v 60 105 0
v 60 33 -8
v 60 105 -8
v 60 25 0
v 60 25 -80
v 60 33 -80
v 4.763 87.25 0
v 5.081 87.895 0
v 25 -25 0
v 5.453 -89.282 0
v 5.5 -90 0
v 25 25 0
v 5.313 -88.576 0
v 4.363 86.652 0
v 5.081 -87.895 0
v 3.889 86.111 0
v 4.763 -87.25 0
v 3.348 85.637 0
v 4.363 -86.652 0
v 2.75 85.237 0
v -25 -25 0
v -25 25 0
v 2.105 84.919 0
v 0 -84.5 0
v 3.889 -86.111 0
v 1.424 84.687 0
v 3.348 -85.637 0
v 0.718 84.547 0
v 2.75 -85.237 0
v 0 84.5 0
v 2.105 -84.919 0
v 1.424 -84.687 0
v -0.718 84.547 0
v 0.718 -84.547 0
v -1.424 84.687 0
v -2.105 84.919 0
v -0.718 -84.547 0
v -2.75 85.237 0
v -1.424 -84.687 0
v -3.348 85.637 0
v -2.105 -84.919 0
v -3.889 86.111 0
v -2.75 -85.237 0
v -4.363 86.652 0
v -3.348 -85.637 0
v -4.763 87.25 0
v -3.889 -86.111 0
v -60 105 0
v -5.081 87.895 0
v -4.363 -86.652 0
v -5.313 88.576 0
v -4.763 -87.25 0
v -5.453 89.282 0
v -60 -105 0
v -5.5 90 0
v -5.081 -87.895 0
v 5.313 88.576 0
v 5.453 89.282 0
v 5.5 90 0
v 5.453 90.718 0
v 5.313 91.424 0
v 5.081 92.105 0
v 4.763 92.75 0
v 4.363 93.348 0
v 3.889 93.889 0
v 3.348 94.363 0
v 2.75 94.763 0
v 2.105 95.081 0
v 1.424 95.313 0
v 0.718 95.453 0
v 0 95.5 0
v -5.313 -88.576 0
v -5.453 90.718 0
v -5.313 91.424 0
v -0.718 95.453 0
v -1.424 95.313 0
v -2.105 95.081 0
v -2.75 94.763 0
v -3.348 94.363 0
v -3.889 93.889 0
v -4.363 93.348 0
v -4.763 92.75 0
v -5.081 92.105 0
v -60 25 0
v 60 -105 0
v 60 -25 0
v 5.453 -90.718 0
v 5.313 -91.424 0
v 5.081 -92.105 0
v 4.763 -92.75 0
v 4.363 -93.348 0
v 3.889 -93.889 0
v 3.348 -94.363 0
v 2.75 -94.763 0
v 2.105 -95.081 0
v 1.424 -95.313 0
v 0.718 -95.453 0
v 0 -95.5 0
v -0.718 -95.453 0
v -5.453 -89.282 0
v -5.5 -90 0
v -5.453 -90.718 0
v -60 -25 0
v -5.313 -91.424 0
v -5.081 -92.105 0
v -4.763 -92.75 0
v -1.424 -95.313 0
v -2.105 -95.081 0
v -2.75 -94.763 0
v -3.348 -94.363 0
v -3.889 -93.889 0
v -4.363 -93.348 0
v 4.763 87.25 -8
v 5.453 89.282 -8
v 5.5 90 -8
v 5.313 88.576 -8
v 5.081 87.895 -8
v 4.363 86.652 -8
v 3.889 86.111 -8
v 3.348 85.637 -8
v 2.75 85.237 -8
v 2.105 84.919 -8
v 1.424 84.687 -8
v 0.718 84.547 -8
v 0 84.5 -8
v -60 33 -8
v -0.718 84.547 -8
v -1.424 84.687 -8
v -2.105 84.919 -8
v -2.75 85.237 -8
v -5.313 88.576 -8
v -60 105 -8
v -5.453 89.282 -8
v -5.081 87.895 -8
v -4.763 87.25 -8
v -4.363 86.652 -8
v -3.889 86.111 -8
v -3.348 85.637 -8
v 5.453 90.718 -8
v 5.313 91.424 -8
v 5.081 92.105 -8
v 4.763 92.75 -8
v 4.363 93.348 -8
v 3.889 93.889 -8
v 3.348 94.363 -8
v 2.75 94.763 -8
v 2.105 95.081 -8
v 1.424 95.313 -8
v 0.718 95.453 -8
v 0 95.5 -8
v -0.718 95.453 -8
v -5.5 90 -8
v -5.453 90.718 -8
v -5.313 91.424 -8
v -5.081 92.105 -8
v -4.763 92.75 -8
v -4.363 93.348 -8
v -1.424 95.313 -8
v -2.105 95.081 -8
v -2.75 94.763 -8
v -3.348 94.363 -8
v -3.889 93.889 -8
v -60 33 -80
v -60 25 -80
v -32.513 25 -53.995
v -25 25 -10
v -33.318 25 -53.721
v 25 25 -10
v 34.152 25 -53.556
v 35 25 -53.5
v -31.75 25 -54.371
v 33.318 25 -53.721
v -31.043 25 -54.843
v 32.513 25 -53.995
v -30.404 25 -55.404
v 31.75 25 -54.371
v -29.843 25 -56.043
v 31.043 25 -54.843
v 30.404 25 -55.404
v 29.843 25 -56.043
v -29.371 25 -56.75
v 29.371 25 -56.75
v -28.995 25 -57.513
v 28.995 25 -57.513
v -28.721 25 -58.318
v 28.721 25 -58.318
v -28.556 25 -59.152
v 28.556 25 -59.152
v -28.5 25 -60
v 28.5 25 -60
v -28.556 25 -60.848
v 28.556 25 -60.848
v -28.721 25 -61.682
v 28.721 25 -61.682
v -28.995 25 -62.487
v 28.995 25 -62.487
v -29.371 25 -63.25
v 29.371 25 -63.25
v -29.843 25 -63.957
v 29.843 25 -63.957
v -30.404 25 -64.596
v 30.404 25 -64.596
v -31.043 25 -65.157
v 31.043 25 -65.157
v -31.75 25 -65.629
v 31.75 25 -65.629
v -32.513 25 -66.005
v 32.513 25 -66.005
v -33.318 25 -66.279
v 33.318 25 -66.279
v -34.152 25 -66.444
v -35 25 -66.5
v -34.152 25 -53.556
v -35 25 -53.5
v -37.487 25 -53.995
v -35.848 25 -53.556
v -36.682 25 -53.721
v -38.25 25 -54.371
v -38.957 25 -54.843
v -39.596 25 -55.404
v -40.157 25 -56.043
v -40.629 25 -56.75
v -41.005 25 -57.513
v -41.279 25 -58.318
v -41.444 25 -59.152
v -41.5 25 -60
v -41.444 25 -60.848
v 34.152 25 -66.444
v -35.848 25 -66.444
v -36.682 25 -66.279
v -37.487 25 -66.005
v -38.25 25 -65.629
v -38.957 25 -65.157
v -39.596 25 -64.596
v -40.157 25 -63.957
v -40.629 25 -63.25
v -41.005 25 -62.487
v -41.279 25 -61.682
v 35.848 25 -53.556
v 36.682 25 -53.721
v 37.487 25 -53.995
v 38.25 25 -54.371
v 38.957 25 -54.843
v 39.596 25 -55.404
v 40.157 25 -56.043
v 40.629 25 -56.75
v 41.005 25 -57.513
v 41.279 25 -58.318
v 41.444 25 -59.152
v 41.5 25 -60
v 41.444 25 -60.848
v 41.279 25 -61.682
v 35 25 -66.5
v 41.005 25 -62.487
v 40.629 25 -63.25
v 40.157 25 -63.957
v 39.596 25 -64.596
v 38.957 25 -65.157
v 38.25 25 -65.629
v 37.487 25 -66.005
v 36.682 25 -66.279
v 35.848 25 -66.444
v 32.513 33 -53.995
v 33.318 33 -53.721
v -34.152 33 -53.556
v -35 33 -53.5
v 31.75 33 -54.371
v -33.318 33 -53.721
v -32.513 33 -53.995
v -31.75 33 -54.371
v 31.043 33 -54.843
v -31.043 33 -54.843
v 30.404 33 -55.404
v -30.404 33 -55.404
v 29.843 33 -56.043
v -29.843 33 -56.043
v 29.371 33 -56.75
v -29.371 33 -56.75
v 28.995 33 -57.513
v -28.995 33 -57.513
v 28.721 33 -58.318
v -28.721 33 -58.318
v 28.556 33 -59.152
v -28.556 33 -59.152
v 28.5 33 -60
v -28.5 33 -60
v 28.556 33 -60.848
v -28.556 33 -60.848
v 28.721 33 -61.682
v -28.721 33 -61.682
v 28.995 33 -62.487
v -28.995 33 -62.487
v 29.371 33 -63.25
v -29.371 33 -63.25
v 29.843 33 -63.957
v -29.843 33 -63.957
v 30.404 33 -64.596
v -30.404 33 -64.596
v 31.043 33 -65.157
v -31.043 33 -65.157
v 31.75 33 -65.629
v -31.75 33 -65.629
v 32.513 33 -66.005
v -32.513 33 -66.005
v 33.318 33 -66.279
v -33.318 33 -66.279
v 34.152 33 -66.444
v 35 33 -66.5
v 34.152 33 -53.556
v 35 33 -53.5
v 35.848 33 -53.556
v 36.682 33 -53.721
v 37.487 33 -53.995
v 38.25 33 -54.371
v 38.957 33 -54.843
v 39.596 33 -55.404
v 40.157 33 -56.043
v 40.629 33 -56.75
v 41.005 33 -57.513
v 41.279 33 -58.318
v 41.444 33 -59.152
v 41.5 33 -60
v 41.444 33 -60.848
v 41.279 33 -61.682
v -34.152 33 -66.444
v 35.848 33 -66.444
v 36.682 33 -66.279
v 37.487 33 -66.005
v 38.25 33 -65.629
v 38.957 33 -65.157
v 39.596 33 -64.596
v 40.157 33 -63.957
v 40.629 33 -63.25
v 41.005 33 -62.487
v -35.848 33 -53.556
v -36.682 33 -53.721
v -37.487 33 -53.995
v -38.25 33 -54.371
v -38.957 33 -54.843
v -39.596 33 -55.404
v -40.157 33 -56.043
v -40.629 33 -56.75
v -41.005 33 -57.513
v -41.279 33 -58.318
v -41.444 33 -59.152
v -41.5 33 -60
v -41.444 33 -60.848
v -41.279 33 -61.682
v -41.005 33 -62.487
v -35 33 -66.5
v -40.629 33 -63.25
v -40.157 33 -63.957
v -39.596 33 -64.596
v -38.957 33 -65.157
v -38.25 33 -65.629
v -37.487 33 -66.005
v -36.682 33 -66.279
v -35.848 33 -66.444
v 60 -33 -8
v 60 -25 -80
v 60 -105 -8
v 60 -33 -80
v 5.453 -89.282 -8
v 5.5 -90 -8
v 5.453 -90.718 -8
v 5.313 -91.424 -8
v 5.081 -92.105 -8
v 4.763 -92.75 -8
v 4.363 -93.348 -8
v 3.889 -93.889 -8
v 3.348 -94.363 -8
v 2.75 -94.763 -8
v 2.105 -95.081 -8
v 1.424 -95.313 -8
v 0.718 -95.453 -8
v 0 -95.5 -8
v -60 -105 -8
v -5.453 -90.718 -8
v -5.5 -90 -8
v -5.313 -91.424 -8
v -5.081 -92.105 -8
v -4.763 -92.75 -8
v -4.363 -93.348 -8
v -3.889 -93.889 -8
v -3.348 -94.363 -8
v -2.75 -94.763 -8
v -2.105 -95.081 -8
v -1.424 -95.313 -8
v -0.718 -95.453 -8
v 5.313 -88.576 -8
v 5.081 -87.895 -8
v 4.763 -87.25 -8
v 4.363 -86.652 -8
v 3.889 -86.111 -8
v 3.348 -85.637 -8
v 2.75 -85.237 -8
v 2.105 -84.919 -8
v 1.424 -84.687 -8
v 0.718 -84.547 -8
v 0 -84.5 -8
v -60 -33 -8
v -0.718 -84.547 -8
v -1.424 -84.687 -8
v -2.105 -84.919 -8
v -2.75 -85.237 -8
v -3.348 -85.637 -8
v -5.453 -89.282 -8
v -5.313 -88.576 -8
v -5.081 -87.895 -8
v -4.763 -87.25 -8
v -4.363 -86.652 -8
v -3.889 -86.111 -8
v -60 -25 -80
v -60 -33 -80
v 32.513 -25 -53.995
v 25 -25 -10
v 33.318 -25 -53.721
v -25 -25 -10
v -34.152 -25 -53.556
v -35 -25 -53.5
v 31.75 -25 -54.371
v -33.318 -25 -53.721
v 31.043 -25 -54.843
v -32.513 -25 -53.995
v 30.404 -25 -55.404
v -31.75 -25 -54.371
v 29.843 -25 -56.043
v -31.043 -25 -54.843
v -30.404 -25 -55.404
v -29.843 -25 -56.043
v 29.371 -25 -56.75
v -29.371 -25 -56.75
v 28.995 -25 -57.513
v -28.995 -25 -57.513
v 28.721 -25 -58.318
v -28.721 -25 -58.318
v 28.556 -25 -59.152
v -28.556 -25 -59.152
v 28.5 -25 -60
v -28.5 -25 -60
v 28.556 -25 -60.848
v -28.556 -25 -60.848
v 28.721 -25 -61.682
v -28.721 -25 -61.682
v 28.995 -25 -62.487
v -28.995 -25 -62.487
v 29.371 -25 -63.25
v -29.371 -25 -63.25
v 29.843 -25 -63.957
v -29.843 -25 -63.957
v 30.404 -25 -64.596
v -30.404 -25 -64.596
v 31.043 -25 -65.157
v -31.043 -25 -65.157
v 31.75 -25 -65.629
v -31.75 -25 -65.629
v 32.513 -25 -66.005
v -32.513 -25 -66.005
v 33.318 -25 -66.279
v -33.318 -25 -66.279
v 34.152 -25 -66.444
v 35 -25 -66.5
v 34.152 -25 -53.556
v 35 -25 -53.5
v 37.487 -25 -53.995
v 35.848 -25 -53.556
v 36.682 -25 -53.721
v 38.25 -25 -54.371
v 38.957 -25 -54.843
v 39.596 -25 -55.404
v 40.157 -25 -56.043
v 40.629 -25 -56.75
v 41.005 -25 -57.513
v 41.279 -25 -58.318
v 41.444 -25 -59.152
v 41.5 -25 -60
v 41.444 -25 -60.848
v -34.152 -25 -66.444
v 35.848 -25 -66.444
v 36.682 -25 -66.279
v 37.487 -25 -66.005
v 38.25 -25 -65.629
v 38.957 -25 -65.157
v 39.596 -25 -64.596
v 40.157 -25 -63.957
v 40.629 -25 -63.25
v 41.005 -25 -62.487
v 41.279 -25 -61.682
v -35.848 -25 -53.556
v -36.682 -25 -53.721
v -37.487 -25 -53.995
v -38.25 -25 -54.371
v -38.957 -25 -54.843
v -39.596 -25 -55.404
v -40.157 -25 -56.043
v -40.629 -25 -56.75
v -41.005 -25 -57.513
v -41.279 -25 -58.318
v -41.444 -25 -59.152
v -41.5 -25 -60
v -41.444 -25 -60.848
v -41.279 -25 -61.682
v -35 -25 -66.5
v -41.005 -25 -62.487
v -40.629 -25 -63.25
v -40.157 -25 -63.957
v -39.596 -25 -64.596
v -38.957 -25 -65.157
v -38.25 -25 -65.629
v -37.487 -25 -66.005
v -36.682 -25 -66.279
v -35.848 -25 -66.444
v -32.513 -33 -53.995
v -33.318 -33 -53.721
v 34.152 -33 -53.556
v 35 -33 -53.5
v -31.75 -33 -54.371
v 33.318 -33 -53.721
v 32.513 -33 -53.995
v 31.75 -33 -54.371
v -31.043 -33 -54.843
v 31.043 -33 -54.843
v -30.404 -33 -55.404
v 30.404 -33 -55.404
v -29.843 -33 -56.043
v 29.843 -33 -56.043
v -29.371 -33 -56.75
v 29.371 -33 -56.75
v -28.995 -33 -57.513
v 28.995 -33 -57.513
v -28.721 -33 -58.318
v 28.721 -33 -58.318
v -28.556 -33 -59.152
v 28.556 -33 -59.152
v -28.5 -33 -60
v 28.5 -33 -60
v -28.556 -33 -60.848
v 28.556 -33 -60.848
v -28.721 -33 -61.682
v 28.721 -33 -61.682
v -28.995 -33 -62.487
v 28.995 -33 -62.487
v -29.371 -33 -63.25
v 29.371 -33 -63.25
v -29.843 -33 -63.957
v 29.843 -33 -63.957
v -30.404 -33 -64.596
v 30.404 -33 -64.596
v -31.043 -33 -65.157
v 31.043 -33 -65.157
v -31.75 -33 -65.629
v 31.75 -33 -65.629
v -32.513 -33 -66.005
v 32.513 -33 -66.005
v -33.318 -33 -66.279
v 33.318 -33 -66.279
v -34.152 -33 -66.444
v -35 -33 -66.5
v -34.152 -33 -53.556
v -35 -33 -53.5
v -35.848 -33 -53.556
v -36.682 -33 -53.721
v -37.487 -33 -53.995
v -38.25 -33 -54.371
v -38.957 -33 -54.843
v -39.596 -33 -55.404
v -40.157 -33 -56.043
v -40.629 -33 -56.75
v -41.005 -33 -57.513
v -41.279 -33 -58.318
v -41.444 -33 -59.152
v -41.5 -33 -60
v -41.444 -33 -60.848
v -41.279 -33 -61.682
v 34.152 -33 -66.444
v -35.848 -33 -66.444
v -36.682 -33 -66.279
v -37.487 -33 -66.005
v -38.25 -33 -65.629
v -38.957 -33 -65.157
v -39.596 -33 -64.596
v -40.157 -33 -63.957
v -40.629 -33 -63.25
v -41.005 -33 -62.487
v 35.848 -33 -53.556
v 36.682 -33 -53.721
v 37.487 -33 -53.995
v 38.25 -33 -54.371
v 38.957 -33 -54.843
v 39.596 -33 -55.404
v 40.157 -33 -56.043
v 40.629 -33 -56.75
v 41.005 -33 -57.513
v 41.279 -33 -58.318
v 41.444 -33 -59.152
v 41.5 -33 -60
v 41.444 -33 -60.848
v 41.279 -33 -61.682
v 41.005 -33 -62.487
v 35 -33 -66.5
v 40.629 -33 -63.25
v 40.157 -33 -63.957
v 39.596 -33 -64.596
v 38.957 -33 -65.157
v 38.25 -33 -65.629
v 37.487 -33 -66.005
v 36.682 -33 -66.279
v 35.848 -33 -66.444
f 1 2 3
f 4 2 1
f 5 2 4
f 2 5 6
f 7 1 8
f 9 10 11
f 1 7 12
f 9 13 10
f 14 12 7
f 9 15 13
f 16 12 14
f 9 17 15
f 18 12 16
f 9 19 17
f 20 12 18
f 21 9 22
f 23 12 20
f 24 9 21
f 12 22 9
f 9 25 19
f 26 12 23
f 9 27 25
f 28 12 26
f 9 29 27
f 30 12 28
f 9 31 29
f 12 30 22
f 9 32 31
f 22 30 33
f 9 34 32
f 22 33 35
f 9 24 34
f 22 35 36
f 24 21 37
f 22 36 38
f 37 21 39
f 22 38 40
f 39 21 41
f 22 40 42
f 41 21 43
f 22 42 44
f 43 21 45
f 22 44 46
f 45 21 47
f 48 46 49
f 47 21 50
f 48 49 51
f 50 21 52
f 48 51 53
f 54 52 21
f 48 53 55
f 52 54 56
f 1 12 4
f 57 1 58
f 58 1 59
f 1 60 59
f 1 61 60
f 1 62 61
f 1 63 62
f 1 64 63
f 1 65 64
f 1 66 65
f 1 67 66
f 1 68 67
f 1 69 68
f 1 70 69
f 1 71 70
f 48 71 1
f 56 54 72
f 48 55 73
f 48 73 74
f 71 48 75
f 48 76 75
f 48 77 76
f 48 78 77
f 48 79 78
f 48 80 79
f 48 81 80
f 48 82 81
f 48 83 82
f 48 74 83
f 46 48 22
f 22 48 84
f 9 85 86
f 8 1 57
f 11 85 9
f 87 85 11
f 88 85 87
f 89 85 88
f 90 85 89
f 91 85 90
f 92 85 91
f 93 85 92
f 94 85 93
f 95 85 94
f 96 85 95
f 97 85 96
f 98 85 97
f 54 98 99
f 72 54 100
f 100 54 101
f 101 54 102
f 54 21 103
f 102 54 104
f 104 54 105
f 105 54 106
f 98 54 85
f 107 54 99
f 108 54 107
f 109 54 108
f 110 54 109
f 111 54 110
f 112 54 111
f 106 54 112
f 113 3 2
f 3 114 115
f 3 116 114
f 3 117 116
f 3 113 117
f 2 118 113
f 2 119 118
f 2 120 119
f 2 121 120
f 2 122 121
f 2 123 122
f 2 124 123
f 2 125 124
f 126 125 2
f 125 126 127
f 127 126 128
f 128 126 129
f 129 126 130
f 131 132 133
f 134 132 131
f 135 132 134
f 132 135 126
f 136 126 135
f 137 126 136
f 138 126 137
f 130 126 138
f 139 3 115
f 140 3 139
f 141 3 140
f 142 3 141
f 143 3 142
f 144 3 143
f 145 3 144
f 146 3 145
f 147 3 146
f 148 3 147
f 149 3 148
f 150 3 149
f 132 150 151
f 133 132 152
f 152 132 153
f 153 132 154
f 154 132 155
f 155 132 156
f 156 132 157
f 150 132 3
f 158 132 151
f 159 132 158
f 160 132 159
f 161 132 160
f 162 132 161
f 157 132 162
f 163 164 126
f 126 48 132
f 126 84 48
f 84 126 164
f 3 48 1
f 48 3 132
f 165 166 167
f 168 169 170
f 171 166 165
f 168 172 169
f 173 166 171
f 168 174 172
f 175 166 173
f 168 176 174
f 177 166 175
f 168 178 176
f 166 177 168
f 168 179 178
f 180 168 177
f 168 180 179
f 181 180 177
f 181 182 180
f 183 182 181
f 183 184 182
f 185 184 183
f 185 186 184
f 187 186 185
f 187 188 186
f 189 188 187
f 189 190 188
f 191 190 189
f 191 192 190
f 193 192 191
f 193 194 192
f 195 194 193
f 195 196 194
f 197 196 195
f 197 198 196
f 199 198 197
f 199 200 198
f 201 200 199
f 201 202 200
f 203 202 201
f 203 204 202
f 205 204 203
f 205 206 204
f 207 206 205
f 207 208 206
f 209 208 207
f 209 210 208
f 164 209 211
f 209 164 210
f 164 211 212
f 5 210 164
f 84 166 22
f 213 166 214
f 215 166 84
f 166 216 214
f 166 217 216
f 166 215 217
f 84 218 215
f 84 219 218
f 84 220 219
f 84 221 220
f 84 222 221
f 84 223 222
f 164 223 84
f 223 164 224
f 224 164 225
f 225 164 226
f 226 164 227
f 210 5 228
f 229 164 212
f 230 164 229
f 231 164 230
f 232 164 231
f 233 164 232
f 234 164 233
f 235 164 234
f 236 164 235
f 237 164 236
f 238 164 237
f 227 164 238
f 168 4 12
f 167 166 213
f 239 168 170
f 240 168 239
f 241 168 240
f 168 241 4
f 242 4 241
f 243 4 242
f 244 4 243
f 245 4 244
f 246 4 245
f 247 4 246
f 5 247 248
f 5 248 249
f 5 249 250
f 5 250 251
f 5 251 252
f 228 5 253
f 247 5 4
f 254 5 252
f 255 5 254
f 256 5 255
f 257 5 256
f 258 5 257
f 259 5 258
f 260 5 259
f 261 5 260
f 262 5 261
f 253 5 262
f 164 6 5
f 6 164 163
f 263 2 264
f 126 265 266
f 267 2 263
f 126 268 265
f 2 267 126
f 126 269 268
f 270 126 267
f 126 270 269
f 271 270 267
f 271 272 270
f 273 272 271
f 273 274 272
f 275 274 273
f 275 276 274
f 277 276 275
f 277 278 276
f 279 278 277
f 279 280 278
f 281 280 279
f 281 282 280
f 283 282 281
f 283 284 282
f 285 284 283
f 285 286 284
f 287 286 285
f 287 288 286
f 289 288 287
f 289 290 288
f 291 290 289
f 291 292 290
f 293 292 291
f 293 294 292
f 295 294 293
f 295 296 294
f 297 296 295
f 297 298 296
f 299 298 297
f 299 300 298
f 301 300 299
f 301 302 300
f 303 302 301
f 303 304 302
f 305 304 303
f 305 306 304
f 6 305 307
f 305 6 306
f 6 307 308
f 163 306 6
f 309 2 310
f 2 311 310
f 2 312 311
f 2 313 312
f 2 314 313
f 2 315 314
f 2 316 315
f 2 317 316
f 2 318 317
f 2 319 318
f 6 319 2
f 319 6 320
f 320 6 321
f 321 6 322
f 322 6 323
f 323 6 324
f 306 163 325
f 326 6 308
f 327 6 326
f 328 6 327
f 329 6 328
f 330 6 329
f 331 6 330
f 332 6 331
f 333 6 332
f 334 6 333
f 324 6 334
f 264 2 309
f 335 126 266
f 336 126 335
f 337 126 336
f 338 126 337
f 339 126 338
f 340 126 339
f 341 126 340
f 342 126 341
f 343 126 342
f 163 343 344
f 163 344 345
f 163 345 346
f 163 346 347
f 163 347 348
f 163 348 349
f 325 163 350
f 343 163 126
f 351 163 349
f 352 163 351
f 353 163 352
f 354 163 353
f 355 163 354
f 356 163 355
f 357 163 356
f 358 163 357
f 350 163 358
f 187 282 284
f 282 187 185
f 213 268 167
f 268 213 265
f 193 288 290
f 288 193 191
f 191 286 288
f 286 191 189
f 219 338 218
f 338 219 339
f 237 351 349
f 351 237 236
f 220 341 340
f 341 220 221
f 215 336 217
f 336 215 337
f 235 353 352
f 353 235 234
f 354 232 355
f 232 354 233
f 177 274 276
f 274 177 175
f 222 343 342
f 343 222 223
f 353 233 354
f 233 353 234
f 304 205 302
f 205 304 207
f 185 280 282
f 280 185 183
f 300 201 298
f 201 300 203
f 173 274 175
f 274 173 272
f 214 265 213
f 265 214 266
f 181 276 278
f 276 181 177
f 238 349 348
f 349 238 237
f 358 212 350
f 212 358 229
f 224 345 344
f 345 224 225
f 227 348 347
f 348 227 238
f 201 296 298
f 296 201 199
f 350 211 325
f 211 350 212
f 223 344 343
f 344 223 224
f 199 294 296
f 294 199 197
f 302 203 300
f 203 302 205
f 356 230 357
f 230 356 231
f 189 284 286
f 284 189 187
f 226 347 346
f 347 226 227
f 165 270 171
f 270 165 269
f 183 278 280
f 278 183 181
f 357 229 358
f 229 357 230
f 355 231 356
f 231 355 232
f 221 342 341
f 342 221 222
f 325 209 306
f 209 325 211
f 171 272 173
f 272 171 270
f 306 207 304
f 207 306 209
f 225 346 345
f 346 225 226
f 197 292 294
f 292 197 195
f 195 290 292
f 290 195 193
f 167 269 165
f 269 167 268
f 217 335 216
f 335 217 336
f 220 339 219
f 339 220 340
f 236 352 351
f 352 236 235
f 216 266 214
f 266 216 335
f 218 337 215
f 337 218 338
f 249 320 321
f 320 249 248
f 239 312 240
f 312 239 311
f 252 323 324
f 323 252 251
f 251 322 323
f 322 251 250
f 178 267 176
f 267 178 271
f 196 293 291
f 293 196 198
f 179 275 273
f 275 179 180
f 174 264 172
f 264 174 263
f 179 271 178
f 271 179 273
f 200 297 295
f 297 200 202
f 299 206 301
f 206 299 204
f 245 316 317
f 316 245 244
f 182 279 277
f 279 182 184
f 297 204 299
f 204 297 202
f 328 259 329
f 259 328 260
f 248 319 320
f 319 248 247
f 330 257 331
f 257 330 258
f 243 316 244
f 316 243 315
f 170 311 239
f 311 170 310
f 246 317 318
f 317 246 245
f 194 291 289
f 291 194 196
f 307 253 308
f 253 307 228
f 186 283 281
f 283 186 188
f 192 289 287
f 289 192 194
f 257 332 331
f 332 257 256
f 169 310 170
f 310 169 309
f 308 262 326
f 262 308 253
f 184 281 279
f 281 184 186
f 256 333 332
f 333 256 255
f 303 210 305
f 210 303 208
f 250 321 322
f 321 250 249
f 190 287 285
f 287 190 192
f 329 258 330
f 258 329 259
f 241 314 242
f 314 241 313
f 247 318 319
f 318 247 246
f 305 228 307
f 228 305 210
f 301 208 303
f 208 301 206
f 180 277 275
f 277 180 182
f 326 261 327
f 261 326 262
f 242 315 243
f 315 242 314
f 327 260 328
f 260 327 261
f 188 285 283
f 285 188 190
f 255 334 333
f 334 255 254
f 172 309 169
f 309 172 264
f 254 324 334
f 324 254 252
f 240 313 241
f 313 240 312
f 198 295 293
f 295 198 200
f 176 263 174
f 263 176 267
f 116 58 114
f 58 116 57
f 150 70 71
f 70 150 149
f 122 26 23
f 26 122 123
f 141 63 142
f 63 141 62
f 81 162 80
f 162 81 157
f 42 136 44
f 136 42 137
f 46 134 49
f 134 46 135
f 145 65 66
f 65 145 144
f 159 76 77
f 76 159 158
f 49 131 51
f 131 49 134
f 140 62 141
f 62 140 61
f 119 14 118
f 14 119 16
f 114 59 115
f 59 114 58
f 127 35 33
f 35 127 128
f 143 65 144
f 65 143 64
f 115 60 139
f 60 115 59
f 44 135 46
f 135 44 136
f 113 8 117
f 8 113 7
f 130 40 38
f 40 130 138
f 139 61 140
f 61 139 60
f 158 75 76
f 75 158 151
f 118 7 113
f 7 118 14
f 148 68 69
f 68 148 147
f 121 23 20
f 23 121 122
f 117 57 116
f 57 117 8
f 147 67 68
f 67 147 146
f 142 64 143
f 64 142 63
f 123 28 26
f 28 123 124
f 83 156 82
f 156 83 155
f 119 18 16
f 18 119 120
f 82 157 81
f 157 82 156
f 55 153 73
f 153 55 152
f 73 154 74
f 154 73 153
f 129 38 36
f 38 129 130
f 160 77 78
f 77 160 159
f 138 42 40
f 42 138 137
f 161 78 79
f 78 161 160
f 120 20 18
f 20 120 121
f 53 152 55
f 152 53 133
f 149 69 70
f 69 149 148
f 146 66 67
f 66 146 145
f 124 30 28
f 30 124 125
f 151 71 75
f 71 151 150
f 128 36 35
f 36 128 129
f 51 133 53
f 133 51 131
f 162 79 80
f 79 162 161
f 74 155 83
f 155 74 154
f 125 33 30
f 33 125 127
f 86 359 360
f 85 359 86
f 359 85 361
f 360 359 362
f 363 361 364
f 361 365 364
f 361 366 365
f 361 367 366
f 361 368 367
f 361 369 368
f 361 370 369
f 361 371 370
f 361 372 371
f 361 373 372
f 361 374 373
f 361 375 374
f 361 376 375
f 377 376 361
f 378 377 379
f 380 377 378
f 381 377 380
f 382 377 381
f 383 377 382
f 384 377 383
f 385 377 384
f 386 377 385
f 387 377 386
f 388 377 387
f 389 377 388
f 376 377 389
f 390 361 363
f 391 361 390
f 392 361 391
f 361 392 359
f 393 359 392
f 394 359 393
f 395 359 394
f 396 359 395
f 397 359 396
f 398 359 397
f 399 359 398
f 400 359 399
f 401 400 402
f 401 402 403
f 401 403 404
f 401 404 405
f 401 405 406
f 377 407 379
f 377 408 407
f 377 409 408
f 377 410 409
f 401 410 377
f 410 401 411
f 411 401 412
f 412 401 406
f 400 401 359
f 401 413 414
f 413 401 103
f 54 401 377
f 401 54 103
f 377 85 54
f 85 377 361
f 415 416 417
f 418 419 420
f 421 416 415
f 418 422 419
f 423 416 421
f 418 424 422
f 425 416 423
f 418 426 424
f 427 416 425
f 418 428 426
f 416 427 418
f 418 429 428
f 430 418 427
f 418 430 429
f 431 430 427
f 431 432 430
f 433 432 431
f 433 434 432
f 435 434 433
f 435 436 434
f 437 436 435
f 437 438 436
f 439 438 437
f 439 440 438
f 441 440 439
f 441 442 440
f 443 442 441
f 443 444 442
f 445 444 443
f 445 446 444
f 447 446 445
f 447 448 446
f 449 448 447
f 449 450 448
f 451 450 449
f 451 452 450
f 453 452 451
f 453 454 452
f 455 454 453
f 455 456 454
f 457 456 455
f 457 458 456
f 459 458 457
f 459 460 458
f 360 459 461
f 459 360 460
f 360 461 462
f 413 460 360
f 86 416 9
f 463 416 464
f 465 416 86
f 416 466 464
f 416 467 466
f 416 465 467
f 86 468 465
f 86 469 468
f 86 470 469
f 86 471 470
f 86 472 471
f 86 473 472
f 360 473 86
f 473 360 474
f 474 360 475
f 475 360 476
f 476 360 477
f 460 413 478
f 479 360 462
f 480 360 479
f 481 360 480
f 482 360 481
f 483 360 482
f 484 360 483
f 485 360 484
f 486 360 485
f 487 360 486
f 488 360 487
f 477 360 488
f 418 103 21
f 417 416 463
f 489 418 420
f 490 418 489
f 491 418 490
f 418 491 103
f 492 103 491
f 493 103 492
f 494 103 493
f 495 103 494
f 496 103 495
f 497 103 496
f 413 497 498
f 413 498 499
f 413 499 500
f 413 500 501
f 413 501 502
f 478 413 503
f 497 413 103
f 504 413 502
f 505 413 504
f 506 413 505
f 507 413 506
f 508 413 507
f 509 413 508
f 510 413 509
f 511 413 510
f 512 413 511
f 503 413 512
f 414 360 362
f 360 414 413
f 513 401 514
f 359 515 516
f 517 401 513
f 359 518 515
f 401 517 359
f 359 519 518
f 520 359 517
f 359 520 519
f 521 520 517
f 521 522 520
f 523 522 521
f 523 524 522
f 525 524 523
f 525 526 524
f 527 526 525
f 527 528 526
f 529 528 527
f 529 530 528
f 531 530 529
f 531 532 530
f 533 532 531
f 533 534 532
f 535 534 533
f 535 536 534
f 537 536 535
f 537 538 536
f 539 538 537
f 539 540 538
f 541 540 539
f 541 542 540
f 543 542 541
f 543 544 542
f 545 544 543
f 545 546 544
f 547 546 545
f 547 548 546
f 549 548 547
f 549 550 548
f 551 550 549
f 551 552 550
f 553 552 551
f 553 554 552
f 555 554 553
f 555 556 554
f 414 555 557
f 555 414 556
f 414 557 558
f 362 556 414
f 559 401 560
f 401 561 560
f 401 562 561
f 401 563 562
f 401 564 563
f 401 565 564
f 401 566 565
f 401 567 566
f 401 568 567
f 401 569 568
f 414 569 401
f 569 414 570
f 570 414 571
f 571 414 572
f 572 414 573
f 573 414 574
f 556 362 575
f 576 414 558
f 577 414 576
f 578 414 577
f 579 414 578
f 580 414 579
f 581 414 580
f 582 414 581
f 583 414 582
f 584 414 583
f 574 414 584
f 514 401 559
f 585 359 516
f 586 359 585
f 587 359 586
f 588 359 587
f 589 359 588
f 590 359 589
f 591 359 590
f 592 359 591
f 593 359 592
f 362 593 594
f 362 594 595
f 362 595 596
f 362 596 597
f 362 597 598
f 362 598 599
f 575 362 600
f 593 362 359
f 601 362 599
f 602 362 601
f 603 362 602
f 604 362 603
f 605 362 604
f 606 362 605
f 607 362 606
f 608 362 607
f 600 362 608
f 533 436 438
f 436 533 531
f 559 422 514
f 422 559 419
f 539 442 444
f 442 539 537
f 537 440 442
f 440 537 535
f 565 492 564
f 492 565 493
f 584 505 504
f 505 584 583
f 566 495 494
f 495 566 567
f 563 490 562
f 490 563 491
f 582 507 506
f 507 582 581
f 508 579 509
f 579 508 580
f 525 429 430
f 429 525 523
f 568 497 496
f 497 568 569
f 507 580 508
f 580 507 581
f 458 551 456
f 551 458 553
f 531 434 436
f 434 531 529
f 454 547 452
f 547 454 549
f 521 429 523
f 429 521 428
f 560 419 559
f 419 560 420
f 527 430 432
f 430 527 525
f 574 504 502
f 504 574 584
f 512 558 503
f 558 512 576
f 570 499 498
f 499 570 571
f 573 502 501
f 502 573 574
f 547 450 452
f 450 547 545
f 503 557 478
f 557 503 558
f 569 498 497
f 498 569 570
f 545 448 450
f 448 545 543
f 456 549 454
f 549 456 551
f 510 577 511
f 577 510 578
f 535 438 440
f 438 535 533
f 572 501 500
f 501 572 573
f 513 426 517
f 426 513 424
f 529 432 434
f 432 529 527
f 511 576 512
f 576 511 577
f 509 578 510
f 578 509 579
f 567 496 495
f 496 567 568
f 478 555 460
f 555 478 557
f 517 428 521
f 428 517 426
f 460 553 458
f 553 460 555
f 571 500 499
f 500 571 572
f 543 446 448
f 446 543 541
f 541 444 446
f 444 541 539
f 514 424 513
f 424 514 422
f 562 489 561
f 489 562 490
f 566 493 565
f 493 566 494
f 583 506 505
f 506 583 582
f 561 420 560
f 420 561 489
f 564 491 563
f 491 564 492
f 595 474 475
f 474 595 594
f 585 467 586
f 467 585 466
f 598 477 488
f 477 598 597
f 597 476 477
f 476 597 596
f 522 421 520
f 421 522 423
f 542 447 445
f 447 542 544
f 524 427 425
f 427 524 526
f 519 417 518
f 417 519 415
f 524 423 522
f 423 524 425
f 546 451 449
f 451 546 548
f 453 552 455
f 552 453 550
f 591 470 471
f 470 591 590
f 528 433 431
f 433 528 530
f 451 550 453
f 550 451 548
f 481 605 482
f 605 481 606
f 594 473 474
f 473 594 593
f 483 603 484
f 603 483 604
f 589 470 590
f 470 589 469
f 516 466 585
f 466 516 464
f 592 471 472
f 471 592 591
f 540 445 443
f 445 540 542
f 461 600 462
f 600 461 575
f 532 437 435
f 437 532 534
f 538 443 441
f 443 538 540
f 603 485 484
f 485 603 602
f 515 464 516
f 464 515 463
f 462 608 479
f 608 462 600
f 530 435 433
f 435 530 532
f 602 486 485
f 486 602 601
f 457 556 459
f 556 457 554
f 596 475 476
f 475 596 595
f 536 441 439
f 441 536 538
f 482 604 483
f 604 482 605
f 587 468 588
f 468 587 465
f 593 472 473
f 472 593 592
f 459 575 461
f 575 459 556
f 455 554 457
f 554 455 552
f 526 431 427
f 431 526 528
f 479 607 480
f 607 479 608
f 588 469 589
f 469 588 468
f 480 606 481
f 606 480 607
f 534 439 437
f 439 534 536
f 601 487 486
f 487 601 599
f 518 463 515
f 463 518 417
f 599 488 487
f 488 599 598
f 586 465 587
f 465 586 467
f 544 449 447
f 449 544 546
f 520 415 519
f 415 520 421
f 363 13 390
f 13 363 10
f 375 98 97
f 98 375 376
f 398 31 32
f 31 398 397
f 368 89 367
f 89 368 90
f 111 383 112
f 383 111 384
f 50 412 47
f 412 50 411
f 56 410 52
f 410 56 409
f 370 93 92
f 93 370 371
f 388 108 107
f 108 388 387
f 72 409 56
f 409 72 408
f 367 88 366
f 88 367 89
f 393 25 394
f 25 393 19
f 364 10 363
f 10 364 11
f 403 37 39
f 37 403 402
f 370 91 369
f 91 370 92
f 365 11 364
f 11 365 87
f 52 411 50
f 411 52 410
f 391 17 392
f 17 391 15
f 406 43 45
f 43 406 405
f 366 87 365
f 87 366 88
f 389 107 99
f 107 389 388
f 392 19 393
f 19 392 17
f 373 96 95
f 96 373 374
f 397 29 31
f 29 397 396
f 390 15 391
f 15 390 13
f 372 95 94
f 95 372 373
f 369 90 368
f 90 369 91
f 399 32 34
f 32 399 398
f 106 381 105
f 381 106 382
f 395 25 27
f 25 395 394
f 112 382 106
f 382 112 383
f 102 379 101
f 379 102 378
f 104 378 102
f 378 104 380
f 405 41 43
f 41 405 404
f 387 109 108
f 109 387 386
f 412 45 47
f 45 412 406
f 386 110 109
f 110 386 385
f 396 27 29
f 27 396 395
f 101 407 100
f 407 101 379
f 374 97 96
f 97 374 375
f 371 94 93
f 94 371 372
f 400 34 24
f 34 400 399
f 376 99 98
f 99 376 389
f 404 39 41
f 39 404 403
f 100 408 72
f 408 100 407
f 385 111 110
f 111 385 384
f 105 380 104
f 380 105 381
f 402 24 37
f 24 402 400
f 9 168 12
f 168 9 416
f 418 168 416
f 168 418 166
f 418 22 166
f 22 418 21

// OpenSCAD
/*
 * Offroad Adventure Trailer - Drawbar Joint, ANGLE-BRACKET variant
 *
 * Budget alternative to the milled cradle (cad/drawbar_cradle.scad):
 * two hot-rolled steel angles L80x80x8 (S355), 120 mm long, flanking the
 * drawbar at the front crossbeam. Straight cuts only, hot-dip galvanized
 * with the frame, a few euro of material — and it keeps BOTH structural
 * tricks of the cradle:
 *   - NO holes in the beam flanges at peak moment (the fatigue killer,
 *     see check_joint_hole / check_angle_joint in scripts/beam_check.py)
 *   - horizontal M12 bolts through the beam WEBS at the NEUTRAL AXIS,
 *     passing through BOTH angles -> they act as a coupled pair
 *   - vertical M10 through each horizontal leg + crossbeam (crush sleeve)
 *
 * The 10 mm spacer plate between beam top and crossbeam bottom stays
 * (it carries the vertical compression; the angles clamp and locate).
 * Sizing: 8 mm legs -> leg-bending SF ~3.4 with the pair sharing the
 * lateral couple (6 mm legs drop to ~1.9 — not worth the saving).
 *
 * Origin: center of the crossbeam contact face, like drawbar_cradle.scad.
 */

bar_w = 50;
bar_h = 100;
tube_w = 50;
spacer_t = 10;
leg = 80;          // angle leg length
t = 8;             // angle thickness
ang_len = 120;     // along the drawbar (X)
d_m10 = 11;
d_m12 = 13;

$fn = 48;

// Modeled directly in installed orientation for the +Y side:
// corner line at (y=0, z=0) = beam side / crossbeam underside;
// horizontal leg outward (+Y) under the crossbeam, vertical leg DOWN
// against the beam web. The -Y side is a mirror.
module angle_bracket() {
    difference() {
        union() {
            translate([0, 0, -t])   cube([ang_len, leg, t]);   // horizontal leg
            translate([0, 0, -leg]) cube([ang_len, t, leg]);   // vertical leg
        }
        // Vertical M10 through the horizontal leg (into the crossbeam,
        // crush sleeve — sits beside the beam)
        translate([ang_len/2, 65, -t - 1]) cylinder(d = d_m10, h = t + 2);
        // Horizontal M12 x2 through the vertical leg at the beam's
        // NEUTRAL AXIS (z = -60: beam top -10, half height 50)
        for (x = [ang_len/2 - 35, ang_len/2 + 35])
            translate([x, -1, -60]) rotate([-90, 0, 0])
                cylinder(d = d_m12, h = t + 2);
    }
}

// --- assembled joint --------------------------------------------------
color("SteelBlue") {
    translate([-ang_len/2, bar_w/2, 0]) angle_bracket();               // right
    mirror([0, 1, 0]) translate([-ang_len/2, bar_w/2, 0]) angle_bracket(); // left
}

// Spacer plate (still needed: carries vertical compression)
color("gold") translate([-tube_w/2, -bar_w/2, -spacer_t])
    cube([tube_w, bar_w, spacer_t]);

// Ghost context: drawbar below, crossbeam above
%color("gray", 0.4) translate([-200, -bar_w/2, -spacer_t - bar_h])
    cube([400, bar_w, bar_h]);
%color("gray", 0.4) translate([-tube_w/2, -160, 0])
    cube([tube_w, 320, tube_w]);
